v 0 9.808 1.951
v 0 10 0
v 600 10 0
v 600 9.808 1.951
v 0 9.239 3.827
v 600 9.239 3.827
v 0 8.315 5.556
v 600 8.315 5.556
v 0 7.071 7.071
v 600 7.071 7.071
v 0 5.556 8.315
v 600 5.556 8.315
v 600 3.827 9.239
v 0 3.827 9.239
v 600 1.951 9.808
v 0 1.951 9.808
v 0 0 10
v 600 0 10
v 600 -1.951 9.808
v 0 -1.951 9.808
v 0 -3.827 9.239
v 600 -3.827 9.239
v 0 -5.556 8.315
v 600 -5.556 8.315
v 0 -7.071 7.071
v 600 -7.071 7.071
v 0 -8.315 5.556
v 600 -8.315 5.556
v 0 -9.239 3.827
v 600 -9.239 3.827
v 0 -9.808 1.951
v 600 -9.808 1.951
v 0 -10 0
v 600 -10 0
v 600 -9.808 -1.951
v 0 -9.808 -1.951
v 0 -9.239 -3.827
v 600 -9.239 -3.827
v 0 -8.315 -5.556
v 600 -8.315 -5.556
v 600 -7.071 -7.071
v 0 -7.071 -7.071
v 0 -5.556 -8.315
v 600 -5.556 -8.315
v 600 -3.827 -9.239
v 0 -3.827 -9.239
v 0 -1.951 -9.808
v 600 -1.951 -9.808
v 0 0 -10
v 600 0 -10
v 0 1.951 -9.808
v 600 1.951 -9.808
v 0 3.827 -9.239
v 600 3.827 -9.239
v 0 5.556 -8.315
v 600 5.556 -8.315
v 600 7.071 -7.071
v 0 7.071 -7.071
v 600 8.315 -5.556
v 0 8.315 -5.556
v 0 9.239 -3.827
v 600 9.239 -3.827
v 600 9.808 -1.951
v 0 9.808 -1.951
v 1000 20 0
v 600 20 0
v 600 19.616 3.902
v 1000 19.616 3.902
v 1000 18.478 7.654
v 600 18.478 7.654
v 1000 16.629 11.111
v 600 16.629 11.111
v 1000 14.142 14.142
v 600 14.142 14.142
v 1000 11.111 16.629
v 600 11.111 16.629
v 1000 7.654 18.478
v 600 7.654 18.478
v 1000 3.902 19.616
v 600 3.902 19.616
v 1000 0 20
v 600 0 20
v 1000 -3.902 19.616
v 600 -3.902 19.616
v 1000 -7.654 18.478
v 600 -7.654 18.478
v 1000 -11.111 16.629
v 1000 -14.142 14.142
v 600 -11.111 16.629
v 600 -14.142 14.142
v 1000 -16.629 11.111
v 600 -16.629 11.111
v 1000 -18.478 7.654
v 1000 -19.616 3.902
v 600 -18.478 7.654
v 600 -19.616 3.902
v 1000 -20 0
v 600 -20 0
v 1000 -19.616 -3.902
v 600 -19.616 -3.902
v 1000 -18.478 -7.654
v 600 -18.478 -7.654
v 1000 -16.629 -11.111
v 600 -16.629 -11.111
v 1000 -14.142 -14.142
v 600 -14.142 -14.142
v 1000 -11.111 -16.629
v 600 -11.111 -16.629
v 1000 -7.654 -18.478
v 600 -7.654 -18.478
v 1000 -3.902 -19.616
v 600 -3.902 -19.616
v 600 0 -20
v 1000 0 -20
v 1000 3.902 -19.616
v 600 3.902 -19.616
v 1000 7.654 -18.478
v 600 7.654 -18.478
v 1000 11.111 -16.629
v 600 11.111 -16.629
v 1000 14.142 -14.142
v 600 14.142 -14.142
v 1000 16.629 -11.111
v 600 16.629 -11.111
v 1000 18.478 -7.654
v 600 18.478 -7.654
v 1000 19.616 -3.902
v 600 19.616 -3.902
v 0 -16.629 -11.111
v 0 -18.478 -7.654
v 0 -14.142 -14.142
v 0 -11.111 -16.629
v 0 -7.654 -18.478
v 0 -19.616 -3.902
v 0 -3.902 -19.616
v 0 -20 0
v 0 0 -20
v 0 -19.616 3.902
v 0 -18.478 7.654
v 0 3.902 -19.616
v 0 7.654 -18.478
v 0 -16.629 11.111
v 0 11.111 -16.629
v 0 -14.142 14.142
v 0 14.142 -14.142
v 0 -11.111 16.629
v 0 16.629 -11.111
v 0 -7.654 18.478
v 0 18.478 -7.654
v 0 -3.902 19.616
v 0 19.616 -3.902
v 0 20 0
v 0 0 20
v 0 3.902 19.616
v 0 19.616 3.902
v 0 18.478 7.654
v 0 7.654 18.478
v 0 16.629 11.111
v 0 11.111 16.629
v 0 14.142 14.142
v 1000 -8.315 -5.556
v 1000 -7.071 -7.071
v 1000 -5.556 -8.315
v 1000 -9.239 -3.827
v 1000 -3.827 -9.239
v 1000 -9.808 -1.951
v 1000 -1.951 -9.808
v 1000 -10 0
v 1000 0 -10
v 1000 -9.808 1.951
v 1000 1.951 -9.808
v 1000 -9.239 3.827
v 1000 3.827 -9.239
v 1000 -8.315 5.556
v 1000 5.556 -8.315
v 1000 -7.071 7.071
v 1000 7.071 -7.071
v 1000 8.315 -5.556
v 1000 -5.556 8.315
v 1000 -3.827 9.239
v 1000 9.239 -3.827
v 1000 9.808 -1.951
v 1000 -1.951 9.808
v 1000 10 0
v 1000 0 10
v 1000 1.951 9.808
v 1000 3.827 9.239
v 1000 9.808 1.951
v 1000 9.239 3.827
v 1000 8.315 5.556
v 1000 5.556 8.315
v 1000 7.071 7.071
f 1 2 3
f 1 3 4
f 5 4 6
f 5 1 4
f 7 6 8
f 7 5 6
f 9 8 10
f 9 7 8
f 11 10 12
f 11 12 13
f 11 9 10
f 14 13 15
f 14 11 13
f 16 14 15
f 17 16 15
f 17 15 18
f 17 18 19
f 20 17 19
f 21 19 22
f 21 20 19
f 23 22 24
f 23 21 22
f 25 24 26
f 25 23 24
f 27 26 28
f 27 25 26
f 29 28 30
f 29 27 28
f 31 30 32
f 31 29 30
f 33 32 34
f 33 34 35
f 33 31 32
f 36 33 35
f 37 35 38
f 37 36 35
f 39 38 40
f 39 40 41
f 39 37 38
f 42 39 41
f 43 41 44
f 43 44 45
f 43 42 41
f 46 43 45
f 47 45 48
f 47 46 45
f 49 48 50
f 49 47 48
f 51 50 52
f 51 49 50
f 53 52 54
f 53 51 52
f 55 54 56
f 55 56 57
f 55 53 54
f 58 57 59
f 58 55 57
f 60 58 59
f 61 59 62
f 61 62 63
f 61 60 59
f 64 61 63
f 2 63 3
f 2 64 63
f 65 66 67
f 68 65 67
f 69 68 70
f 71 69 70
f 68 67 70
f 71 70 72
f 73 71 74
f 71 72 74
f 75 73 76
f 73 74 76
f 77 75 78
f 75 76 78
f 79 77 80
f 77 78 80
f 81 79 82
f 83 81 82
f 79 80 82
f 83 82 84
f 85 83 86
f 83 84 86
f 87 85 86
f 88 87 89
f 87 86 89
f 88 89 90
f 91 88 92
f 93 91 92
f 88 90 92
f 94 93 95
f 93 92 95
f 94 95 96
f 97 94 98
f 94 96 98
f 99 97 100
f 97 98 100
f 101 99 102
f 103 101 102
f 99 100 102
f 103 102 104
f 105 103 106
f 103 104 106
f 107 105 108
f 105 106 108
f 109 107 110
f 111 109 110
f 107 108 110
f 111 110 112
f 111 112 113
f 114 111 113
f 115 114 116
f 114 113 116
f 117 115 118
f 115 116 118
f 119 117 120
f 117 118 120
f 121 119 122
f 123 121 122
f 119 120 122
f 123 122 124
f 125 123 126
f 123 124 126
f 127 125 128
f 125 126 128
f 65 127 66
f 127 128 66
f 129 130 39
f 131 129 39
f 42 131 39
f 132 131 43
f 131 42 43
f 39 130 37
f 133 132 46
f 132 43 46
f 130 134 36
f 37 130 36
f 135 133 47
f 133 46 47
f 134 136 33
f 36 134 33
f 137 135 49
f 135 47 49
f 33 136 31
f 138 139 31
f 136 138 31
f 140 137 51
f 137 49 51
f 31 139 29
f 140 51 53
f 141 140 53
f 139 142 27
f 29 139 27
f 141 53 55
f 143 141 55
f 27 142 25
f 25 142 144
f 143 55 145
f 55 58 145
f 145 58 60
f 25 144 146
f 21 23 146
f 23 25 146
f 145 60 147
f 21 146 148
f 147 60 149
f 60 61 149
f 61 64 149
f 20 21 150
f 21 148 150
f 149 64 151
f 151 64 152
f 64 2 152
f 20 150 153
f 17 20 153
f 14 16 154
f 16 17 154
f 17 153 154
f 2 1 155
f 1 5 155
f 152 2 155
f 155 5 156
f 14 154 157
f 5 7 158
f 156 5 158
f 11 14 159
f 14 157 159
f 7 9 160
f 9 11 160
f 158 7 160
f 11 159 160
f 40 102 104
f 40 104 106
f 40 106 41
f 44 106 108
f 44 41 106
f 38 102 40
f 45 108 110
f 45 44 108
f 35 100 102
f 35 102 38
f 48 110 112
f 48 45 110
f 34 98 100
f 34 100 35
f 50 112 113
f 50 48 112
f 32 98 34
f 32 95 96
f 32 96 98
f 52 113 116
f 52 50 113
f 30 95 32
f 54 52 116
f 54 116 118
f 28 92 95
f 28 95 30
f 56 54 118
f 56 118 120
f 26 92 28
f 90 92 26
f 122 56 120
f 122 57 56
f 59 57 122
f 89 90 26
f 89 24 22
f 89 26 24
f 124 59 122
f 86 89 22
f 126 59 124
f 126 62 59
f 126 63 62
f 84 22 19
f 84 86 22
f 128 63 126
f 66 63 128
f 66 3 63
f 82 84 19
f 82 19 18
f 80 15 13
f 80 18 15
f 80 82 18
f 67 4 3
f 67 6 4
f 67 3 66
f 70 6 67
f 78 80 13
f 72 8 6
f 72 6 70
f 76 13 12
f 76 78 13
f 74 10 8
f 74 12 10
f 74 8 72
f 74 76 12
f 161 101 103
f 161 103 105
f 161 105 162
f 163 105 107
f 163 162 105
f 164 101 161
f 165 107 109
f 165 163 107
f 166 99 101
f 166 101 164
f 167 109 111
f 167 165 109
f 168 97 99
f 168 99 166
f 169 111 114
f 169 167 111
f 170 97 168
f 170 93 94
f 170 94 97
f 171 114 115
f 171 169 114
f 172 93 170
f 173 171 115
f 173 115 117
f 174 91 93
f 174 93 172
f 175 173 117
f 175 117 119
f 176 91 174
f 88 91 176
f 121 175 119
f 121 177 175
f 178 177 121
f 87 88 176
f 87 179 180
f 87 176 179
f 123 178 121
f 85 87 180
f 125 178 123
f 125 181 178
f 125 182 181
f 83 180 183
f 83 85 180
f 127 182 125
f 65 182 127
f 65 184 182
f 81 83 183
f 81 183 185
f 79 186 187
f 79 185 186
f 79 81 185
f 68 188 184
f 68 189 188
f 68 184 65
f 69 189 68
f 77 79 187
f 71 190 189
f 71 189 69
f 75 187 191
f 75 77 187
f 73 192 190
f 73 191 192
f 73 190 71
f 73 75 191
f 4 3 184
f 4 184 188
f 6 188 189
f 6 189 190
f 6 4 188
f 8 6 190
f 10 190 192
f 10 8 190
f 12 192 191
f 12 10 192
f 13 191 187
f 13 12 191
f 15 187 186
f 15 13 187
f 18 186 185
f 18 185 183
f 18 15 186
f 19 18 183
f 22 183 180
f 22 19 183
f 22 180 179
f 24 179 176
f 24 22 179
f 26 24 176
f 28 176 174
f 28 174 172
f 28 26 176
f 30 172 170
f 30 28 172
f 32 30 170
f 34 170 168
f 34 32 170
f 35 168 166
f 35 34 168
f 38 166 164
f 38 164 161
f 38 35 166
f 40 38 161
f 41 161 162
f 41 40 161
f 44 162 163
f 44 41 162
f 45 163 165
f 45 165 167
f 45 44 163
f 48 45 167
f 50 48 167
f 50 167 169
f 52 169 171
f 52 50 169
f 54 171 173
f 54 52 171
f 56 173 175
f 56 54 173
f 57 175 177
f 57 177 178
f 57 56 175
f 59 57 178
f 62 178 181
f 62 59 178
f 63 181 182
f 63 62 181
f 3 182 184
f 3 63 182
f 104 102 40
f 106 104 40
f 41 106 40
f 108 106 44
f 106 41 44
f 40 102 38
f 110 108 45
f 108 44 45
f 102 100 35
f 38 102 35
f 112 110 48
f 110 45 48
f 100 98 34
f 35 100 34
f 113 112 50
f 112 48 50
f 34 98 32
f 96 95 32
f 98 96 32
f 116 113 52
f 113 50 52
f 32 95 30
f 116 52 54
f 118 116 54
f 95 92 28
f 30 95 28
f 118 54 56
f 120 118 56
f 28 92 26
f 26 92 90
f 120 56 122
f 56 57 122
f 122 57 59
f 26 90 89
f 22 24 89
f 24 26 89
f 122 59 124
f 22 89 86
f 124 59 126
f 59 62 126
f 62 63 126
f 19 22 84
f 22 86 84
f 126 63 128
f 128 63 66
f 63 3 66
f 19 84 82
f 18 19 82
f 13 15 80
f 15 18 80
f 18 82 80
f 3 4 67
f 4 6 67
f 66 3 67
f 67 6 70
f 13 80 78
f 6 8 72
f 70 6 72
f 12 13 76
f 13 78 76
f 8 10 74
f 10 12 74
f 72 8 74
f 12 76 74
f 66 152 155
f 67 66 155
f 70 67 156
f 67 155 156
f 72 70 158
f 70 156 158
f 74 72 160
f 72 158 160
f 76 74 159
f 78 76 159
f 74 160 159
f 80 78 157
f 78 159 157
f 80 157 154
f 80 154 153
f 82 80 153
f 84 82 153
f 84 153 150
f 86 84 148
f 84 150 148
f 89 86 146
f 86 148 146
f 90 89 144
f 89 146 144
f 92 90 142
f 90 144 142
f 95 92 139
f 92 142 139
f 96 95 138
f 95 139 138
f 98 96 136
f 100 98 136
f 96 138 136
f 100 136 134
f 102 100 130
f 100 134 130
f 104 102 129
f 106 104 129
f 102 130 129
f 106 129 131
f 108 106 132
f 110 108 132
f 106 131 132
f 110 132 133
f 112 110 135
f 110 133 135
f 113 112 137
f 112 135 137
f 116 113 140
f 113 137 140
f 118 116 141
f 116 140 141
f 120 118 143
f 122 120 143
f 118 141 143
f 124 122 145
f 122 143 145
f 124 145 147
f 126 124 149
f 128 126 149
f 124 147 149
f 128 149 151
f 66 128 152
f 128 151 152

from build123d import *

# Parameters (mm, degrees)
SKETCH12_R                = 20
SKETCH12_R_2              = 10
PIPE_33_7_X_4_0_2_DEPTH   = 600
SKETCH12_ON_SEGMENT_2_R   = 20
SKETCH12_ON_SEGMENT_2_R_2 = 10
PIPE_33_7_X_4_0_2_2_DEPTH = 400


with BuildPart() as part:
    # Sketch12 → Pipe 33.7 X 4.0(2) (new body)
    with BuildSketch(Plane.YZ):
        Circle(SKETCH12_R)
        Circle(SKETCH12_R_2, mode=Mode.SUBTRACT)
    extrude(amount=PIPE_33_7_X_4_0_2_DEPTH)


with BuildPart() as body_2:
    # Sketch12 on segment 2 (carried to segment 2) → Pipe 33.7 X 4.0_2 2 (new body)
    with BuildSketch(Plane.YZ.offset(600)):
        Circle(SKETCH12_ON_SEGMENT_2_R)
        Circle(SKETCH12_ON_SEGMENT_2_R_2, mode=Mode.SUBTRACT)
    extrude(amount=PIPE_33_7_X_4_0_2_2_DEPTH)


solid = Compound([part.part, body_2.part])
